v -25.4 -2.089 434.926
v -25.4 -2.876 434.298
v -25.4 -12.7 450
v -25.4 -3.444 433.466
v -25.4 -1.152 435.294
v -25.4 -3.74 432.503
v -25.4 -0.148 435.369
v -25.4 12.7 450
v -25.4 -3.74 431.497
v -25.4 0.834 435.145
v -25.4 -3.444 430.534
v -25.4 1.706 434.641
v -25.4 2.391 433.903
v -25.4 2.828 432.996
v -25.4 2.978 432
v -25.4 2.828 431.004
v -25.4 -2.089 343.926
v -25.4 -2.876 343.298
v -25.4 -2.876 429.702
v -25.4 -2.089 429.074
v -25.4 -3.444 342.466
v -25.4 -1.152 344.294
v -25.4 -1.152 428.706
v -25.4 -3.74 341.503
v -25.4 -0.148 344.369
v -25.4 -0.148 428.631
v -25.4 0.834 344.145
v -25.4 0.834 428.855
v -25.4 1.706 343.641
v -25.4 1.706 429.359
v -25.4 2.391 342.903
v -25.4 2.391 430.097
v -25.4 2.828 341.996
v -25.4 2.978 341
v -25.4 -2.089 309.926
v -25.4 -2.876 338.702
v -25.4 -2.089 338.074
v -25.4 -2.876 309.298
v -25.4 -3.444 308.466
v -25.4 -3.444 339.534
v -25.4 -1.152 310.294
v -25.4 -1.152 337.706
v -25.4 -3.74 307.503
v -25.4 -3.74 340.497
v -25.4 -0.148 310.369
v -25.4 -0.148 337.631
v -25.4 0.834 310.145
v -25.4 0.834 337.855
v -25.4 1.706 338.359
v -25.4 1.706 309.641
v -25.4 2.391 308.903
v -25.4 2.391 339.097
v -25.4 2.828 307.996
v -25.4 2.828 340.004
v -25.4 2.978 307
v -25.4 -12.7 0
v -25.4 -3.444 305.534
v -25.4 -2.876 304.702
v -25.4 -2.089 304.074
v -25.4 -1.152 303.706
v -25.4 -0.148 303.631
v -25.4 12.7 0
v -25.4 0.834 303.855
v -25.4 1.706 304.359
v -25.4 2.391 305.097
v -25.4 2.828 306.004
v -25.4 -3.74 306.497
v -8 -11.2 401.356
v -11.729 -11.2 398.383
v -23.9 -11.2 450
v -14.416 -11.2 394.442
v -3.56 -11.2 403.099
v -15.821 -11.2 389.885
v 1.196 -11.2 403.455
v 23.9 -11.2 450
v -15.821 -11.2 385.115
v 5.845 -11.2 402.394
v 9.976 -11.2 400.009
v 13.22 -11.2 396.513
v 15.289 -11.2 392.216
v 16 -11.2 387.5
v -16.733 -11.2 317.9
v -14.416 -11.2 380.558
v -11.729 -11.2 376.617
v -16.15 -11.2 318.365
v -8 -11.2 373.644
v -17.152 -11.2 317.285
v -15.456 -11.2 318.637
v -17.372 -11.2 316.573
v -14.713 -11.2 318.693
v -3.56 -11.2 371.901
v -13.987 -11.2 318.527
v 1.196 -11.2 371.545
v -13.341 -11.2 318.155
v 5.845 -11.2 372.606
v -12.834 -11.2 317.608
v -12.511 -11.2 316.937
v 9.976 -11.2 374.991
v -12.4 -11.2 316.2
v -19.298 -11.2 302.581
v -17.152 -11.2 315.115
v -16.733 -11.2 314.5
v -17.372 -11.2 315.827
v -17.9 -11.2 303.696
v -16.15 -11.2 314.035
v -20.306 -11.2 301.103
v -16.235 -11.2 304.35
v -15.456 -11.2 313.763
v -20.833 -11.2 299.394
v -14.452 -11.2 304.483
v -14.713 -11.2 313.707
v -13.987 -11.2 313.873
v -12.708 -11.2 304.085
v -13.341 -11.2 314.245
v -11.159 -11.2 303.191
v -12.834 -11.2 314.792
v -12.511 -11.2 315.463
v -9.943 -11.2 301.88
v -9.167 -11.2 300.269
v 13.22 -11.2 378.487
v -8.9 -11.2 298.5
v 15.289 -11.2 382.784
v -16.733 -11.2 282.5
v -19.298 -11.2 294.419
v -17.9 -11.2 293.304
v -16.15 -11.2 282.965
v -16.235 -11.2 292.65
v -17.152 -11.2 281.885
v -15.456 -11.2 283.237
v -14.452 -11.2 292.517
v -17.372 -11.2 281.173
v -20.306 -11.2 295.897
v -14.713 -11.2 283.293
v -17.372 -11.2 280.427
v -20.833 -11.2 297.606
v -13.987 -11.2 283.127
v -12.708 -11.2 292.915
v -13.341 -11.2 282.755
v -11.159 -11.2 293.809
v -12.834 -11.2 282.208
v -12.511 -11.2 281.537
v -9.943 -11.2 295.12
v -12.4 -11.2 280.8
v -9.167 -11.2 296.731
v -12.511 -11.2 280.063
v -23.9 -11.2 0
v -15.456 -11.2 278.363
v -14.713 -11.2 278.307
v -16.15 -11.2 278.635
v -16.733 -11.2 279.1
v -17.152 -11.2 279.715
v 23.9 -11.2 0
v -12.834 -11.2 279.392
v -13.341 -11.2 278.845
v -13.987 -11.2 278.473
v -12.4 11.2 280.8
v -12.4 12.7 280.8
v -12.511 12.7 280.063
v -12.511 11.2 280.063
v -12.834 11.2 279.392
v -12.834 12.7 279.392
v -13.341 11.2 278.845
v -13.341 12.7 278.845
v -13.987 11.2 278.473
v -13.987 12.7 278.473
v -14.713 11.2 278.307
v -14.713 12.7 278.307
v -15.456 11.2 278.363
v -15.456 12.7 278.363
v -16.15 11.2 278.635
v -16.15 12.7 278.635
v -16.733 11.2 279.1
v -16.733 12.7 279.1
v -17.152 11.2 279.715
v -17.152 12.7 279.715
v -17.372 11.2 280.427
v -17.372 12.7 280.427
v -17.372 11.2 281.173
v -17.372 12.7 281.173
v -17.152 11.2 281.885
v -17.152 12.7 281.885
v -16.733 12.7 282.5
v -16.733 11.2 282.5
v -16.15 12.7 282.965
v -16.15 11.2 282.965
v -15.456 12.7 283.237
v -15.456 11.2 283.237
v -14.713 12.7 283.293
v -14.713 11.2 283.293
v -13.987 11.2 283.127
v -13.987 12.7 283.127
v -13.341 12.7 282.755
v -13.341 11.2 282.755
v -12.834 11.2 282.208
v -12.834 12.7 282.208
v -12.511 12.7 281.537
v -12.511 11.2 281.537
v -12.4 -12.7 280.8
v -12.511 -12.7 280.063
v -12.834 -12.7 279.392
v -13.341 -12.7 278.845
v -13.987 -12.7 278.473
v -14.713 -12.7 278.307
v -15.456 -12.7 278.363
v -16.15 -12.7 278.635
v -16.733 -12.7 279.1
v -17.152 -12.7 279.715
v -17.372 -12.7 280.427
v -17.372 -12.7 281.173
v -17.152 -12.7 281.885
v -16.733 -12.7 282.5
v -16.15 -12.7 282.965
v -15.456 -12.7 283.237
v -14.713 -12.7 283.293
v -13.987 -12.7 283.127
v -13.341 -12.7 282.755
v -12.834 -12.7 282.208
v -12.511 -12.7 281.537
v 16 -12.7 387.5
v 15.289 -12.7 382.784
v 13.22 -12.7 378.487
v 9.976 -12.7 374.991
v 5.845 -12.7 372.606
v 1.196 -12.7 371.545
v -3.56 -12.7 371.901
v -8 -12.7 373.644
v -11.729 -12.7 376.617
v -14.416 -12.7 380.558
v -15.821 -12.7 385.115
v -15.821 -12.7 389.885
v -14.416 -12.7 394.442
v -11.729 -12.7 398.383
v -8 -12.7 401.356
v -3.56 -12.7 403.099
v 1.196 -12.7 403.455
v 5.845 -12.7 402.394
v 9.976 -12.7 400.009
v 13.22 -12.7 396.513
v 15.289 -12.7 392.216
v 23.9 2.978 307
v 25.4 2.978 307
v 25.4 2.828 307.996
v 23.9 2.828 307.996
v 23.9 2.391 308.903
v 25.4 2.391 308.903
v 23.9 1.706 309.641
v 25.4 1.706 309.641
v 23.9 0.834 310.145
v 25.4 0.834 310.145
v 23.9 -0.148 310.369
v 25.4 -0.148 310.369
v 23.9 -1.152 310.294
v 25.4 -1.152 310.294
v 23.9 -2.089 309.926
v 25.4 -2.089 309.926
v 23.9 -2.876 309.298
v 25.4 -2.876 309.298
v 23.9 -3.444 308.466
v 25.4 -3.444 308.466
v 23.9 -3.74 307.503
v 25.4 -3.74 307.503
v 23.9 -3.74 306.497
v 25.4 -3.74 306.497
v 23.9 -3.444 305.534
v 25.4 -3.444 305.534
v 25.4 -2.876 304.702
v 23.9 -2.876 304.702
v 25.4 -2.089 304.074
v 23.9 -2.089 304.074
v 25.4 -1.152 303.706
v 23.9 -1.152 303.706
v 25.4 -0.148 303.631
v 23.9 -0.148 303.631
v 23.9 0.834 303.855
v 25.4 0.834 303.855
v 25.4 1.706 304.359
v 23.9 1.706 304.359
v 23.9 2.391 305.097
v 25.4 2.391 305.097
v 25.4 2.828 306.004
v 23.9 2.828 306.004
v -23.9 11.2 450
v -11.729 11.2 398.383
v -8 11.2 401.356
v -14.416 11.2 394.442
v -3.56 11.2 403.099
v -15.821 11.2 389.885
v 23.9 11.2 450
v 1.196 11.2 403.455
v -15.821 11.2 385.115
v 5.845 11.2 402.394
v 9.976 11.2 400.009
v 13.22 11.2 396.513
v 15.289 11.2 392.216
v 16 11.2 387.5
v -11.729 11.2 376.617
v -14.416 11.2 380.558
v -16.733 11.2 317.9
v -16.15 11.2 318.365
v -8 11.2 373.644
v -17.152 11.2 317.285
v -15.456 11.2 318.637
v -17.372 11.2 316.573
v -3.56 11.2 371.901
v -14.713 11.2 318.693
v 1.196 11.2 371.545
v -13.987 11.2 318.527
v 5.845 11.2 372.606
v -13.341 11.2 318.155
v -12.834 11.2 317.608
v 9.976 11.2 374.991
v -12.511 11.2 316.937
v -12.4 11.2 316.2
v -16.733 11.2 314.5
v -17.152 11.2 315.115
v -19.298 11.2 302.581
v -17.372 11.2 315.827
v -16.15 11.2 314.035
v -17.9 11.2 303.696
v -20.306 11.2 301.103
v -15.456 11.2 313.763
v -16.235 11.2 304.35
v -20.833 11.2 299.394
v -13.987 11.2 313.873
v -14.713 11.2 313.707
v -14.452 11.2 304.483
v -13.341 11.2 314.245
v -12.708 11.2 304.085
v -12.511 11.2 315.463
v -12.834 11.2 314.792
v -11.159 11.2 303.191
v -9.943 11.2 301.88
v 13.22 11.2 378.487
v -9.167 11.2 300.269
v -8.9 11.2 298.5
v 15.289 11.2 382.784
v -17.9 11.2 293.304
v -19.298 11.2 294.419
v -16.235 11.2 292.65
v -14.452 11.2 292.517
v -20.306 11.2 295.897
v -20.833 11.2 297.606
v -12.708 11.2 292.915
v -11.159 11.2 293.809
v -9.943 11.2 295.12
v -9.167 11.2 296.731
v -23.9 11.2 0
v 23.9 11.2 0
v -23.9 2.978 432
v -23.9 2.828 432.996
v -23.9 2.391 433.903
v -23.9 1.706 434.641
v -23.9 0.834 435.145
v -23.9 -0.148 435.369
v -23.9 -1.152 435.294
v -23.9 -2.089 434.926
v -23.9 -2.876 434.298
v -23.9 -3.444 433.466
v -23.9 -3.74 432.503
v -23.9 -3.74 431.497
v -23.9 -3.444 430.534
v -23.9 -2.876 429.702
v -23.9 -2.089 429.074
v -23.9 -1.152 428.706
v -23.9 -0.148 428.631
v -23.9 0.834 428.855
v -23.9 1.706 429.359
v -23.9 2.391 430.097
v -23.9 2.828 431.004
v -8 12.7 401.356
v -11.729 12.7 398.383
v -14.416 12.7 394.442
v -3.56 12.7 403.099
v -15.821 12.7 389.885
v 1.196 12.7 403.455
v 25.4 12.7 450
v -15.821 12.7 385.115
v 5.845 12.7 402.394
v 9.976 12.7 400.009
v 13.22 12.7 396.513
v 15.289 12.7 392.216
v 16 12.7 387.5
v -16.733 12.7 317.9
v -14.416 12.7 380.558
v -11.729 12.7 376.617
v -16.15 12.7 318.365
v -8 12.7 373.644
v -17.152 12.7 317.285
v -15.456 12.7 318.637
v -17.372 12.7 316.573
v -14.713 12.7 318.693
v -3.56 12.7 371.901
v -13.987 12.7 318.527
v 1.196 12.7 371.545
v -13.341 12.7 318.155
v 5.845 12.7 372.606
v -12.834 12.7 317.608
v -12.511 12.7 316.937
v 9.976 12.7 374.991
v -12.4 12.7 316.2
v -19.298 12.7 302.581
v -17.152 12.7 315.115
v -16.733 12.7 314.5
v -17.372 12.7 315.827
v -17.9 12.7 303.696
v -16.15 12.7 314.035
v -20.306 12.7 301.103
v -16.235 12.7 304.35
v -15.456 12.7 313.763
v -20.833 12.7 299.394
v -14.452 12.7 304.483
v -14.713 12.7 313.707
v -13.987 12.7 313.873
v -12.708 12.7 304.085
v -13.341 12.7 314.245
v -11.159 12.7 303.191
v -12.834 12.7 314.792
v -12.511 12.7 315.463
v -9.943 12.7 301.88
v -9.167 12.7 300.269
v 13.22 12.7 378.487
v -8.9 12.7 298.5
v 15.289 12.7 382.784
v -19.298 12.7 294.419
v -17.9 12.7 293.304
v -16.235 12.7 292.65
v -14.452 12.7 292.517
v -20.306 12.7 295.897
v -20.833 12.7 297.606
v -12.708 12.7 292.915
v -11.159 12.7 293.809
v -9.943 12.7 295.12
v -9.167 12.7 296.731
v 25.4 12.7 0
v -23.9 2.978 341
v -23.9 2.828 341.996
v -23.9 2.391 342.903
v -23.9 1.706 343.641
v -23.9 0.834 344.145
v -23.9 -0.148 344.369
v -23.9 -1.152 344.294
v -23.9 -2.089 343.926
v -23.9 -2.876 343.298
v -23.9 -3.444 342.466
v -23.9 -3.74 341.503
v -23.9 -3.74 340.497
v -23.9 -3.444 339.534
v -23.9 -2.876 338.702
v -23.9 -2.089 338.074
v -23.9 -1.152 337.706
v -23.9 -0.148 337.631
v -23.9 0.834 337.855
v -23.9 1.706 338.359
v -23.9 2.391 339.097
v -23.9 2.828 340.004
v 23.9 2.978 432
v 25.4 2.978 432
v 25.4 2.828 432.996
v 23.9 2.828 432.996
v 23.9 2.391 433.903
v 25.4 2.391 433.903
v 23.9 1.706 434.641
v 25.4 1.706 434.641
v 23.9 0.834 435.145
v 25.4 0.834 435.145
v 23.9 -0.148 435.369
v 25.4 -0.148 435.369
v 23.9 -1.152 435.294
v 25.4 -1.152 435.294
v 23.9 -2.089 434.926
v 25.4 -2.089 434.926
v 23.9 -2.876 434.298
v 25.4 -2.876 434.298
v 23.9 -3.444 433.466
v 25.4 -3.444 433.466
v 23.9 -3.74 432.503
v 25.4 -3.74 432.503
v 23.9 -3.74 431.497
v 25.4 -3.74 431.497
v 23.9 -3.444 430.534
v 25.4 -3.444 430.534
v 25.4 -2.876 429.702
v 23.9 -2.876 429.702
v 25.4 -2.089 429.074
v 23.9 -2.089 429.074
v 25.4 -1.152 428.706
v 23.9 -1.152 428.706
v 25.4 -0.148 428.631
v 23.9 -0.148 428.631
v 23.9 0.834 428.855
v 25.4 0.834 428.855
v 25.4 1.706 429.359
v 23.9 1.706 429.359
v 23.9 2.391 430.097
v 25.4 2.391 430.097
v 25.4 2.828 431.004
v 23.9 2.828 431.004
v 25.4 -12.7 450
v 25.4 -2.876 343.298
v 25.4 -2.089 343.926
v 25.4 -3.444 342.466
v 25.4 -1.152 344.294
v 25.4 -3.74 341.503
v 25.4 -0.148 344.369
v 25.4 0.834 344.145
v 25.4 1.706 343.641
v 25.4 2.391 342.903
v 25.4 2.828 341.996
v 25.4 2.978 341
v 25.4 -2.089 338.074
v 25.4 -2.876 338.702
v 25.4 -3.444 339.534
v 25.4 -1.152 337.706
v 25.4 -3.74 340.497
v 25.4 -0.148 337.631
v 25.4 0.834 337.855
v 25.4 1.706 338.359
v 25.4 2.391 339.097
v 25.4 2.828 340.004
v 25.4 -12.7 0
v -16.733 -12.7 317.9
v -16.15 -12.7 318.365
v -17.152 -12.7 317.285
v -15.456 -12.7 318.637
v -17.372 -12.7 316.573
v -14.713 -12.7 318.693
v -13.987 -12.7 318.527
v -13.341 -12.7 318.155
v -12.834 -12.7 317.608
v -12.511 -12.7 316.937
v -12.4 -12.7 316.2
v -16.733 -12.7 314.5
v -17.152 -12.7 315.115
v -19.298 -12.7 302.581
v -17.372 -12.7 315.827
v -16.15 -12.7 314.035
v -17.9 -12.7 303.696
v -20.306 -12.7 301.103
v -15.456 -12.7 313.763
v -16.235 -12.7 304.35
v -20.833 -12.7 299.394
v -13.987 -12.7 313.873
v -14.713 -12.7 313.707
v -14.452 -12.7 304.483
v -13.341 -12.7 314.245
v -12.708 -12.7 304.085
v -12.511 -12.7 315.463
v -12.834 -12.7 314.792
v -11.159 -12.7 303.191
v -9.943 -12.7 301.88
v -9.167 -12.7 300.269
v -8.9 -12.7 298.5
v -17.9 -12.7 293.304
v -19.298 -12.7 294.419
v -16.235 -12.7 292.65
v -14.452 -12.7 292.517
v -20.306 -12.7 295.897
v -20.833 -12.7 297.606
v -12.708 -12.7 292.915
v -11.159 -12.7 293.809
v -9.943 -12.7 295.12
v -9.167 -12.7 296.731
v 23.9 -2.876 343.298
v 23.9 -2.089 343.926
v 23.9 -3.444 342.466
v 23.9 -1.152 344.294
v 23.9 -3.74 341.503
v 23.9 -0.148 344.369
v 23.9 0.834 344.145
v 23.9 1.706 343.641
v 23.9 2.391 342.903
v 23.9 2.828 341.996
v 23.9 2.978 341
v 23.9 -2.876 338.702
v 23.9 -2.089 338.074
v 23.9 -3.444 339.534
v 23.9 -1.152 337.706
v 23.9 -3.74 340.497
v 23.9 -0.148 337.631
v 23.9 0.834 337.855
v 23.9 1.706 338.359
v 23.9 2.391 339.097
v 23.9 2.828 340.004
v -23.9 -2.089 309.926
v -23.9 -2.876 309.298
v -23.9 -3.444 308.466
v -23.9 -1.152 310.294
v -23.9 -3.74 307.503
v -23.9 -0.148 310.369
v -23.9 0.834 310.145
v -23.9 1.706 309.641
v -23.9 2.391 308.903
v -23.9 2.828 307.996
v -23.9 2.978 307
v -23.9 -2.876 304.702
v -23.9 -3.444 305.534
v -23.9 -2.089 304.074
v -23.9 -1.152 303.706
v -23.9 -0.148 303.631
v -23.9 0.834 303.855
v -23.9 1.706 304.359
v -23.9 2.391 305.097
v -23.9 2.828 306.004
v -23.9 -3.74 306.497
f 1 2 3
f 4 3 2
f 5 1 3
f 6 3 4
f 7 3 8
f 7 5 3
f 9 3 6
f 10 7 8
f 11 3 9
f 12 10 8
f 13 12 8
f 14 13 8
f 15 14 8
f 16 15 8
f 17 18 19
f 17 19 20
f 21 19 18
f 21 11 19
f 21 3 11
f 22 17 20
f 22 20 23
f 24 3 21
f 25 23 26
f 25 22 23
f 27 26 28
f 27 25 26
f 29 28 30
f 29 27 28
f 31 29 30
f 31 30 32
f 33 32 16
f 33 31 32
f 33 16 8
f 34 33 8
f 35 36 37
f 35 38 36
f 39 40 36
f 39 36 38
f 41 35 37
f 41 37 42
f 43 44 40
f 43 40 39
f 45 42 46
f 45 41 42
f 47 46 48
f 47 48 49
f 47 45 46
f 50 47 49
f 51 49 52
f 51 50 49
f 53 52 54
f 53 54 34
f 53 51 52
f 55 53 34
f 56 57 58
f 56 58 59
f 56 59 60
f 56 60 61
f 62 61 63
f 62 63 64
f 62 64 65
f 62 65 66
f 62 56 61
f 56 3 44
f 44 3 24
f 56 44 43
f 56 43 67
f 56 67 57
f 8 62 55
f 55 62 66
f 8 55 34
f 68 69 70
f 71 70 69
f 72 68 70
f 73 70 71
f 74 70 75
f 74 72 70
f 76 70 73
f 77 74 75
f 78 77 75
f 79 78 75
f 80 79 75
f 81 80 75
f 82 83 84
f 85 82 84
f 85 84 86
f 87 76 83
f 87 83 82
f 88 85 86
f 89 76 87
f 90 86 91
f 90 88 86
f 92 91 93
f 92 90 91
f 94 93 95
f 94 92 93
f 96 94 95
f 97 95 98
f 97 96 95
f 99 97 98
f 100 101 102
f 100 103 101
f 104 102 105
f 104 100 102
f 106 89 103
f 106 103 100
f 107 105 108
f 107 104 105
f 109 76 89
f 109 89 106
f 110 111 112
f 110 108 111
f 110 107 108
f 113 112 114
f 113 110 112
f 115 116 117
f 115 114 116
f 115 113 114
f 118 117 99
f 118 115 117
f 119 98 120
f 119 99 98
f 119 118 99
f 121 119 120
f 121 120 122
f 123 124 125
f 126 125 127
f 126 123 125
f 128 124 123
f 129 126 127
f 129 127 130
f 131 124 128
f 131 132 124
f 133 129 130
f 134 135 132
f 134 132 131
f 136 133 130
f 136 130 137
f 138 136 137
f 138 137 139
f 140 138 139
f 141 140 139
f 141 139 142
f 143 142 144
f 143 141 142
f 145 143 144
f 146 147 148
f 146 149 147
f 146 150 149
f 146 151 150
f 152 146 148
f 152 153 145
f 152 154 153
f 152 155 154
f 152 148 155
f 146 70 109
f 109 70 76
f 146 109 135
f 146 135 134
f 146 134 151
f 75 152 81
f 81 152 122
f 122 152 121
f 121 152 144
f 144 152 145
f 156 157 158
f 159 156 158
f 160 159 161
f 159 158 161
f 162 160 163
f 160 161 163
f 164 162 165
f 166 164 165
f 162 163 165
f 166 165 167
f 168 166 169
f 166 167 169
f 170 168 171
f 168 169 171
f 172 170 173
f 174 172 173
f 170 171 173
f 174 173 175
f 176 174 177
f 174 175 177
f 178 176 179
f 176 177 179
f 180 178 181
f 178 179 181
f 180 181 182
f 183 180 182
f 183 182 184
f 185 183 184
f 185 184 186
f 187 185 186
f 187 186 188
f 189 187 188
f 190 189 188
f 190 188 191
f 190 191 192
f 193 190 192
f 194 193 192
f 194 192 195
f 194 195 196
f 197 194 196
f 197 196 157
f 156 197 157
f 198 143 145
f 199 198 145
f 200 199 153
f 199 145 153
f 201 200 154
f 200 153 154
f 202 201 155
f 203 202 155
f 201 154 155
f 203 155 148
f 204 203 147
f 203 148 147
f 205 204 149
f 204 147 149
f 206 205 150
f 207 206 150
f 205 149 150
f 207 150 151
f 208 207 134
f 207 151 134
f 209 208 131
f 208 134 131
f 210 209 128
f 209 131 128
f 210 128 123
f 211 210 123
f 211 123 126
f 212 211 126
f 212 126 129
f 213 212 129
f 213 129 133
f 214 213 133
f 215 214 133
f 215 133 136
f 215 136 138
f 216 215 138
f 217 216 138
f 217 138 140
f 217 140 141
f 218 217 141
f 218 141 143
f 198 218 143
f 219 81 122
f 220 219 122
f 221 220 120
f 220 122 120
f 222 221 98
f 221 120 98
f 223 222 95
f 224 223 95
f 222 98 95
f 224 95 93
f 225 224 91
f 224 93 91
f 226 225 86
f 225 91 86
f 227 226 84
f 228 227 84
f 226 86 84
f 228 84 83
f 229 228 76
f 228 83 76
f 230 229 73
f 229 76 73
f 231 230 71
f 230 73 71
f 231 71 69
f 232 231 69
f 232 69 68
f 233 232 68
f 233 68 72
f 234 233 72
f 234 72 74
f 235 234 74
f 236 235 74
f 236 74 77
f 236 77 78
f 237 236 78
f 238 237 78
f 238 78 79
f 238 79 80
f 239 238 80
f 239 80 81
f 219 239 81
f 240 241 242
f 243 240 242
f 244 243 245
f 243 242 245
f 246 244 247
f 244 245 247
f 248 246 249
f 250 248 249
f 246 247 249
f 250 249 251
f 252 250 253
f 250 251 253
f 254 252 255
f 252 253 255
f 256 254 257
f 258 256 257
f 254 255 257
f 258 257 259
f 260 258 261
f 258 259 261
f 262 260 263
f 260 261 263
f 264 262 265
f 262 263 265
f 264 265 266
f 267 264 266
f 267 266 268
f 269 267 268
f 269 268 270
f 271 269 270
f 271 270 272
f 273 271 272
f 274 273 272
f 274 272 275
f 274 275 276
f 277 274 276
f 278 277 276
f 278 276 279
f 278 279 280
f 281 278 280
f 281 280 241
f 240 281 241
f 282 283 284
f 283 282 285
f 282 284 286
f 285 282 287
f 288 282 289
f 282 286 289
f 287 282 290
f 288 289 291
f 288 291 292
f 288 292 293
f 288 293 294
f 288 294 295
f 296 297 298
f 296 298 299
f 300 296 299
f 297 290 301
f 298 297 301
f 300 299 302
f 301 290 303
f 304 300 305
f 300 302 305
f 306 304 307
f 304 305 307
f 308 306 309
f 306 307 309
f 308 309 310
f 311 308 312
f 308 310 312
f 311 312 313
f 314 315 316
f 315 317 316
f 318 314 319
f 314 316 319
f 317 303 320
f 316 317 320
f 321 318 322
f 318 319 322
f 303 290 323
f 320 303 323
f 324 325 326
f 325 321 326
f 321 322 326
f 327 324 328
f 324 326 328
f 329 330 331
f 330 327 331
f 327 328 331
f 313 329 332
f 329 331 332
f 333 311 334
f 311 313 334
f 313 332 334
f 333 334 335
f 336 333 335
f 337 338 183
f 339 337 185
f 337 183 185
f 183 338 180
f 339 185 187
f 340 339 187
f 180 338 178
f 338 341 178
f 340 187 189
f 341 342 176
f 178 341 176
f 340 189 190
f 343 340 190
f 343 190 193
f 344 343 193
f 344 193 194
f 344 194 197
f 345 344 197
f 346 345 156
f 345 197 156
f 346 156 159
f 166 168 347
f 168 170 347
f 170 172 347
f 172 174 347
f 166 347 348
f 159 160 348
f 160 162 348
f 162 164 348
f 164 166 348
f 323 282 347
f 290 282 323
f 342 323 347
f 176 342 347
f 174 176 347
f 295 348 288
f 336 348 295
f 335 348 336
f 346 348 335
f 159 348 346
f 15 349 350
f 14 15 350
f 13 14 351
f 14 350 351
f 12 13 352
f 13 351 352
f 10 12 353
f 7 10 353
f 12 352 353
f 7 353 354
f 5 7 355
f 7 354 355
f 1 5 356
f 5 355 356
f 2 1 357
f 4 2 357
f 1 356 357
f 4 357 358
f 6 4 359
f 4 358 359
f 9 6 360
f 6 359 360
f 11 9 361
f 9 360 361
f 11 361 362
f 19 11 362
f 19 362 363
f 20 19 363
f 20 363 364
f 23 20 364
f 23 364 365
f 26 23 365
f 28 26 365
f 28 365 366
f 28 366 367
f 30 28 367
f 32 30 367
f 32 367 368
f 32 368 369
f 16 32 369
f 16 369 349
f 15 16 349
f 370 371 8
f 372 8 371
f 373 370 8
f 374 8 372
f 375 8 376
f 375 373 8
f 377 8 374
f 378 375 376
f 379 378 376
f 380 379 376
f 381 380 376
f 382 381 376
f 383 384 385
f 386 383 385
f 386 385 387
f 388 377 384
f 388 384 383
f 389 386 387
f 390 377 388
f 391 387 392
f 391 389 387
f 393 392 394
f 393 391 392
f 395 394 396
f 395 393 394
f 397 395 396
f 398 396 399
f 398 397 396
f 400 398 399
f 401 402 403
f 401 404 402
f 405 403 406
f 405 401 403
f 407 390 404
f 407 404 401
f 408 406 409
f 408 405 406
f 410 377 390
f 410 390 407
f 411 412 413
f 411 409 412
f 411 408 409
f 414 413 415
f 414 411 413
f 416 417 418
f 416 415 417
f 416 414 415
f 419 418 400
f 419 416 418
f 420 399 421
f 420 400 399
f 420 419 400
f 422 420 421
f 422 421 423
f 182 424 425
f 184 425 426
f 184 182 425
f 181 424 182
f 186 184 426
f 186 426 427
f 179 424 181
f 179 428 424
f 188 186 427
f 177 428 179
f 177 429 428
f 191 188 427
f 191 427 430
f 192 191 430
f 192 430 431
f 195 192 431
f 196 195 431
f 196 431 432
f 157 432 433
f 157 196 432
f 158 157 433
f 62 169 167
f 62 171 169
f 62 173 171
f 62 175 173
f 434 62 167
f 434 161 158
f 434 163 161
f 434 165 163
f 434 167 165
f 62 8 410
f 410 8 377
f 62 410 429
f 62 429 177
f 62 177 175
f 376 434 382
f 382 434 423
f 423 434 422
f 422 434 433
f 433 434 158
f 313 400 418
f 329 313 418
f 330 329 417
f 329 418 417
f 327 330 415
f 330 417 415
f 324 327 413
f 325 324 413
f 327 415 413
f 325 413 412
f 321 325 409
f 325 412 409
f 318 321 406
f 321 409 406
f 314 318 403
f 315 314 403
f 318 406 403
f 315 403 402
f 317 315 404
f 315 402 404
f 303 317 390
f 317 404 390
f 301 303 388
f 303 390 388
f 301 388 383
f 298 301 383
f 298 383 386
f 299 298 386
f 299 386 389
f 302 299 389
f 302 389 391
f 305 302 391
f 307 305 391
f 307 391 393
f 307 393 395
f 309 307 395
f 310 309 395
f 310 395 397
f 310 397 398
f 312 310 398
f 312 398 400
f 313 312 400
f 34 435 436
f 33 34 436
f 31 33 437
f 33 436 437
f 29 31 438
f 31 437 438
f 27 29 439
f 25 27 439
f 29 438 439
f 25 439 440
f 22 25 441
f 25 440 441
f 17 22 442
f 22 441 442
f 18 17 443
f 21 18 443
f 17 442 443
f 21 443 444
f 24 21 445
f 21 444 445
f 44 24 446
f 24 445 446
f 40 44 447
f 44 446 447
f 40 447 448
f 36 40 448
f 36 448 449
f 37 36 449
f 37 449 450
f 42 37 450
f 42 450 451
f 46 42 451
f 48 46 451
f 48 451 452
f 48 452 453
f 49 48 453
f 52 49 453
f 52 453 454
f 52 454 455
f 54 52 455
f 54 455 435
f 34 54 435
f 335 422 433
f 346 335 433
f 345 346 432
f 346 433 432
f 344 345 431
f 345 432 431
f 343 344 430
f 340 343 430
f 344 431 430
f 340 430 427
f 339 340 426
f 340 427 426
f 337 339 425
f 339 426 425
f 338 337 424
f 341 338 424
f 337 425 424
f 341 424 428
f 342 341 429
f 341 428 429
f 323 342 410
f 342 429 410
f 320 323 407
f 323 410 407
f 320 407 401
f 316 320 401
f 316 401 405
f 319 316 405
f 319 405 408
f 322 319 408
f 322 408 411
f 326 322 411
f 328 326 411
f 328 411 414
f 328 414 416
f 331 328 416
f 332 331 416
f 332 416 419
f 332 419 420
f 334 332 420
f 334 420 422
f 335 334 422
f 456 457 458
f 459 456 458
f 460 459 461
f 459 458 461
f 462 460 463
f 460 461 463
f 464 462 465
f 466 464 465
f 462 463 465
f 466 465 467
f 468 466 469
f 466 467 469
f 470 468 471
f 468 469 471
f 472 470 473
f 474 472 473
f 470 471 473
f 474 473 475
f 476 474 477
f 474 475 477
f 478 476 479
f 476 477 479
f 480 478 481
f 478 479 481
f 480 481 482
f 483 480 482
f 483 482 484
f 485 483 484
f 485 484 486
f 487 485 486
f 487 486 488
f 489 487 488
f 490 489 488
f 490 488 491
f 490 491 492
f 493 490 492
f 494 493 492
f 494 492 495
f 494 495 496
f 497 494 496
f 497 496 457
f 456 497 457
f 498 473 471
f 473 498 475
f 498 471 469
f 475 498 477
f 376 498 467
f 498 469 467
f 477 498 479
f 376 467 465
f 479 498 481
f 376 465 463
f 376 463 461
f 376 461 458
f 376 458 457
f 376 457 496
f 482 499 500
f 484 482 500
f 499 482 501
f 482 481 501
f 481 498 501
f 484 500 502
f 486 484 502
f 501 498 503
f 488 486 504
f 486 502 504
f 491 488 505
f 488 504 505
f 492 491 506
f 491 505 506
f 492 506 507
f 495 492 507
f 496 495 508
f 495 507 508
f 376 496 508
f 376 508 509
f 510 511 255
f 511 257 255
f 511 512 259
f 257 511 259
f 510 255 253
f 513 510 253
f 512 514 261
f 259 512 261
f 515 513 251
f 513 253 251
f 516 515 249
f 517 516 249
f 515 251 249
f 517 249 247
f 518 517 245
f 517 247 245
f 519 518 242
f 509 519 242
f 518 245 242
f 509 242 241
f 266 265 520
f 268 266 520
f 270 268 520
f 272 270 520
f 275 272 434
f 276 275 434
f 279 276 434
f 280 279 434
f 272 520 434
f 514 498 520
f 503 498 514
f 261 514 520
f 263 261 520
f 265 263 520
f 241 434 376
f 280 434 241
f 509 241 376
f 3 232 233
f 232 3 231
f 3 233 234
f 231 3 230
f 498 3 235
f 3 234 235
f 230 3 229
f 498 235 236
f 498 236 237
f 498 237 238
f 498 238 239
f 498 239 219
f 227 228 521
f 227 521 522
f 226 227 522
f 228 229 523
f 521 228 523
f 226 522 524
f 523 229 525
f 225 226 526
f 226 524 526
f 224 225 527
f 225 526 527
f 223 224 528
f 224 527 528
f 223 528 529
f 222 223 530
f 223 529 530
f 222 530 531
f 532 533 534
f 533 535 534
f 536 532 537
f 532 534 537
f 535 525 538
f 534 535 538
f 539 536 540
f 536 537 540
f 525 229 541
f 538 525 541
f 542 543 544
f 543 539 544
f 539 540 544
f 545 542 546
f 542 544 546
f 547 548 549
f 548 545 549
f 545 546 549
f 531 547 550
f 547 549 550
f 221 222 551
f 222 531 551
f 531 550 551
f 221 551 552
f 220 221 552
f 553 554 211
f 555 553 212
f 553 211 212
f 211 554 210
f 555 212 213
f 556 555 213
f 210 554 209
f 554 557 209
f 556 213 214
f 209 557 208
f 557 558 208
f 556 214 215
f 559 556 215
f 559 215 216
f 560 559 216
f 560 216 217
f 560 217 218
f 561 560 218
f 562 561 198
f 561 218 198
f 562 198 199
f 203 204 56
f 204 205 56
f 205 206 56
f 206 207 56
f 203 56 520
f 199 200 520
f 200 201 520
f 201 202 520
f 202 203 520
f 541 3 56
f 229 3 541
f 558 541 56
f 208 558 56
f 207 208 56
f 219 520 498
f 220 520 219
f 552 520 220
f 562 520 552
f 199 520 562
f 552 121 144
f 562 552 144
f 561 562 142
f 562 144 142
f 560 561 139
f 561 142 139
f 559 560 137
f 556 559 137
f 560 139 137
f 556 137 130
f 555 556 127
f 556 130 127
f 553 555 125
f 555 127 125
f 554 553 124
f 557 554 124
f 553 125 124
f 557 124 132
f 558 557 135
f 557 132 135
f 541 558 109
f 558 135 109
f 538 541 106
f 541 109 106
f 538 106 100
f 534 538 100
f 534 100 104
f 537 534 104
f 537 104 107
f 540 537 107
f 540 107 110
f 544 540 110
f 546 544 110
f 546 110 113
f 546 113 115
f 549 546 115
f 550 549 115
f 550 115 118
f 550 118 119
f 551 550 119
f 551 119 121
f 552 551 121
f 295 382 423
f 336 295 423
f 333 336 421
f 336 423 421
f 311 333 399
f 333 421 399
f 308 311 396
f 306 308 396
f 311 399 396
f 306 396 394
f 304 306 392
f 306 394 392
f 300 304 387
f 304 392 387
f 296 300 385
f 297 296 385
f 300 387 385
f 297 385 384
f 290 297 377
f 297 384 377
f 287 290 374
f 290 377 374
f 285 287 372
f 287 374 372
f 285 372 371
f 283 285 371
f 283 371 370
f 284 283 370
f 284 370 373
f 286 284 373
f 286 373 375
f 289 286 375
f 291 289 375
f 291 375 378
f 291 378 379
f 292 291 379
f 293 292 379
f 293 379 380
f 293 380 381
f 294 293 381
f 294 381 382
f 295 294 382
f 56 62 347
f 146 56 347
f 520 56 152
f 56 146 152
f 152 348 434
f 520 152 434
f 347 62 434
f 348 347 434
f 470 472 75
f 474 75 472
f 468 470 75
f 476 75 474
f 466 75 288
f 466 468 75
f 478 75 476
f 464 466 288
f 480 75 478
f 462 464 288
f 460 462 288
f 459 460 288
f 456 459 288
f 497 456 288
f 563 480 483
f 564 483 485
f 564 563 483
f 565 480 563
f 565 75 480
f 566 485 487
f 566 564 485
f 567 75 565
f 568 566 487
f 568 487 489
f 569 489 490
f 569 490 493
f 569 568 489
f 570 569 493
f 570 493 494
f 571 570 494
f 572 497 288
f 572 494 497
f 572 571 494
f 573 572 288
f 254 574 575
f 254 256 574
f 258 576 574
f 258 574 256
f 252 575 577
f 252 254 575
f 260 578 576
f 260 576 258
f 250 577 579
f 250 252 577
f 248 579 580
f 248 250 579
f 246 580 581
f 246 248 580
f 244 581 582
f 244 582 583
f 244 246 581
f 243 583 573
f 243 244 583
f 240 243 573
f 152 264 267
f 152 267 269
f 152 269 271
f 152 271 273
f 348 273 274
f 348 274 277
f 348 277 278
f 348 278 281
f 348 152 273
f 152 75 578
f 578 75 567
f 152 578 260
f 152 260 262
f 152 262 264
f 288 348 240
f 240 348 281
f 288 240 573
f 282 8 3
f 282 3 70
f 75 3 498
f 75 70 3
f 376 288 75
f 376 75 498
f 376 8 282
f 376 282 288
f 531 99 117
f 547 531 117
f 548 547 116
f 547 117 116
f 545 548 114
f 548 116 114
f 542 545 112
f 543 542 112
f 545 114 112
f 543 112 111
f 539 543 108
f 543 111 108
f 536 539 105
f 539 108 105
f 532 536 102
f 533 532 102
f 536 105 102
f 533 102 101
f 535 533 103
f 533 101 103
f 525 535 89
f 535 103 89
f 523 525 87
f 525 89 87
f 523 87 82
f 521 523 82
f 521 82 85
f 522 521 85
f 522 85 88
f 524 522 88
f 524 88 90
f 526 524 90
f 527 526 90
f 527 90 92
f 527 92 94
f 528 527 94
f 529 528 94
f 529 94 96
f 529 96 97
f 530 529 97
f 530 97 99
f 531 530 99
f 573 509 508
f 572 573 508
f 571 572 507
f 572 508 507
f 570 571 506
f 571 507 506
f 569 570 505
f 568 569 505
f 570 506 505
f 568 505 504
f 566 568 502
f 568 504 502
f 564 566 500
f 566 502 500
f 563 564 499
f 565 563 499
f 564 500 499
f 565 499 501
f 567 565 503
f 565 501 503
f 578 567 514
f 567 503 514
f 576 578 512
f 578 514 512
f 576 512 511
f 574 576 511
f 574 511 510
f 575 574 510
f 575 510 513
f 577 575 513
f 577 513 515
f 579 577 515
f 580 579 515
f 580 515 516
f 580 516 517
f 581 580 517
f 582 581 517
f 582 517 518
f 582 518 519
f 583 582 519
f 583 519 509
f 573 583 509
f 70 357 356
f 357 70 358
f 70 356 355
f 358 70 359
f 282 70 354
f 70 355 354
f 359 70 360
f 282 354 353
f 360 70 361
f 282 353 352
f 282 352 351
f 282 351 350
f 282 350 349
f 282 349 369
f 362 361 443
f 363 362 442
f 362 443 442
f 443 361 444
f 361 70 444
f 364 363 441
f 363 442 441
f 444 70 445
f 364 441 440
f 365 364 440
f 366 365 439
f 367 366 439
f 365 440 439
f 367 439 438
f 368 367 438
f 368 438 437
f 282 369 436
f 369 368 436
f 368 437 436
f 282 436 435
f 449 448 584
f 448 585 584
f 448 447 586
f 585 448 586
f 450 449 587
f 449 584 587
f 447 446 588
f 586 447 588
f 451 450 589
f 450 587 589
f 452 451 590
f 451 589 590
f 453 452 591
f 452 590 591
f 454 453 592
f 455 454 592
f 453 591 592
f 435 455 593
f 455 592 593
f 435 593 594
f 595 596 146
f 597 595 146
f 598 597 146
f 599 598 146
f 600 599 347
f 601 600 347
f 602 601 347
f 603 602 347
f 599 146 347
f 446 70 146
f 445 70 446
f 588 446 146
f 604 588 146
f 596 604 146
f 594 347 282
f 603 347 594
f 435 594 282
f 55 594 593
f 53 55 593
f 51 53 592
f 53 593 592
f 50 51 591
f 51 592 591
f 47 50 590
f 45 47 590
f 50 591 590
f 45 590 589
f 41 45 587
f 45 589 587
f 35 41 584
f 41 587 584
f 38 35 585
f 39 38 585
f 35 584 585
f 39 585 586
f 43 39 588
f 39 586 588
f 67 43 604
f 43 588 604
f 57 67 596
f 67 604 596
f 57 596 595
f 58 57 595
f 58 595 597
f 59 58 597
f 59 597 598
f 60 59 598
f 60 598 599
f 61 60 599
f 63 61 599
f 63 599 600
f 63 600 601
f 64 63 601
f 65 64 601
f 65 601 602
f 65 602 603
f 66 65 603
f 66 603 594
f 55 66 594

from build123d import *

# Parameters (mm, degrees)
CROQUIS1_W                    = 50.8
CROQUIS1_H                    = 25.4
CROQUIS1_W_2                  = 47.8
CROQUIS1_H_2                  = 22.4
SALIENTE_EXTRUIR1_DEPTH       = 450
CROQUIS2_R                    = 16
CORTAR_EXTRUIR1_DEPTH         = 26
TALADRO_DE_MARGEN_PARA_1_42_D = 6.7564
CROQUIS7_R                    = 6
CROQUIS7_R_2                  = 2.5
CORTAR_EXTRUIR2_DEPTH         = 25.4


with BuildPart() as part:
    # Croquis1 → Saliente-Extruir1 (new body)
    with BuildSketch(Plane.XY):
        Rectangle(CROQUIS1_W, CROQUIS1_H)
        Rectangle(CROQUIS1_W_2, CROQUIS1_H_2, mode=Mode.SUBTRACT)
    extrude(amount=SALIENTE_EXTRUIR1_DEPTH)

    # Croquis2 → Cortar-Extruir1 (cut)
    with BuildSketch(Plane(origin=(0, 12.7, 0), x_dir=(1, 0, 0), z_dir=(0, 1, 0))):
        with Locations((0, -387.5)):
            Circle(CROQUIS2_R)
    extrude(amount=-CORTAR_EXTRUIR1_DEPTH, mode=Mode.SUBTRACT)

    # Taladro de margen para 1/42 (through all)
    with Locations(Plane(origin=(-26.4, 572.488619806, 162.989101594), x_dir=(0, -1, 0), z_dir=(-1, 0, 0))):
        with Locations((572.888619806, 269.010898406), (572.888619806, 178.010898406), (572.888619806, 144.010898406)):
            Hole(TALADRO_DE_MARGEN_PARA_1_42_D / 2)

    # Croquis7 → Cortar-Extruir2 (cut)
    with BuildSketch(Plane(origin=(0, 12.7, 0), x_dir=(1, 0, 0), z_dir=(0, 1, 0))):
        with Locations((-14.9, -298.5)):
            Circle(CROQUIS7_R)
        with Locations((-14.9, -280.8)):
            Circle(CROQUIS7_R_2)
        with Locations((-14.9, -316.2)):
            Circle(CROQUIS7_R_2)
    extrude(amount=-CORTAR_EXTRUIR2_DEPTH, mode=Mode.SUBTRACT)


solid = part.part
